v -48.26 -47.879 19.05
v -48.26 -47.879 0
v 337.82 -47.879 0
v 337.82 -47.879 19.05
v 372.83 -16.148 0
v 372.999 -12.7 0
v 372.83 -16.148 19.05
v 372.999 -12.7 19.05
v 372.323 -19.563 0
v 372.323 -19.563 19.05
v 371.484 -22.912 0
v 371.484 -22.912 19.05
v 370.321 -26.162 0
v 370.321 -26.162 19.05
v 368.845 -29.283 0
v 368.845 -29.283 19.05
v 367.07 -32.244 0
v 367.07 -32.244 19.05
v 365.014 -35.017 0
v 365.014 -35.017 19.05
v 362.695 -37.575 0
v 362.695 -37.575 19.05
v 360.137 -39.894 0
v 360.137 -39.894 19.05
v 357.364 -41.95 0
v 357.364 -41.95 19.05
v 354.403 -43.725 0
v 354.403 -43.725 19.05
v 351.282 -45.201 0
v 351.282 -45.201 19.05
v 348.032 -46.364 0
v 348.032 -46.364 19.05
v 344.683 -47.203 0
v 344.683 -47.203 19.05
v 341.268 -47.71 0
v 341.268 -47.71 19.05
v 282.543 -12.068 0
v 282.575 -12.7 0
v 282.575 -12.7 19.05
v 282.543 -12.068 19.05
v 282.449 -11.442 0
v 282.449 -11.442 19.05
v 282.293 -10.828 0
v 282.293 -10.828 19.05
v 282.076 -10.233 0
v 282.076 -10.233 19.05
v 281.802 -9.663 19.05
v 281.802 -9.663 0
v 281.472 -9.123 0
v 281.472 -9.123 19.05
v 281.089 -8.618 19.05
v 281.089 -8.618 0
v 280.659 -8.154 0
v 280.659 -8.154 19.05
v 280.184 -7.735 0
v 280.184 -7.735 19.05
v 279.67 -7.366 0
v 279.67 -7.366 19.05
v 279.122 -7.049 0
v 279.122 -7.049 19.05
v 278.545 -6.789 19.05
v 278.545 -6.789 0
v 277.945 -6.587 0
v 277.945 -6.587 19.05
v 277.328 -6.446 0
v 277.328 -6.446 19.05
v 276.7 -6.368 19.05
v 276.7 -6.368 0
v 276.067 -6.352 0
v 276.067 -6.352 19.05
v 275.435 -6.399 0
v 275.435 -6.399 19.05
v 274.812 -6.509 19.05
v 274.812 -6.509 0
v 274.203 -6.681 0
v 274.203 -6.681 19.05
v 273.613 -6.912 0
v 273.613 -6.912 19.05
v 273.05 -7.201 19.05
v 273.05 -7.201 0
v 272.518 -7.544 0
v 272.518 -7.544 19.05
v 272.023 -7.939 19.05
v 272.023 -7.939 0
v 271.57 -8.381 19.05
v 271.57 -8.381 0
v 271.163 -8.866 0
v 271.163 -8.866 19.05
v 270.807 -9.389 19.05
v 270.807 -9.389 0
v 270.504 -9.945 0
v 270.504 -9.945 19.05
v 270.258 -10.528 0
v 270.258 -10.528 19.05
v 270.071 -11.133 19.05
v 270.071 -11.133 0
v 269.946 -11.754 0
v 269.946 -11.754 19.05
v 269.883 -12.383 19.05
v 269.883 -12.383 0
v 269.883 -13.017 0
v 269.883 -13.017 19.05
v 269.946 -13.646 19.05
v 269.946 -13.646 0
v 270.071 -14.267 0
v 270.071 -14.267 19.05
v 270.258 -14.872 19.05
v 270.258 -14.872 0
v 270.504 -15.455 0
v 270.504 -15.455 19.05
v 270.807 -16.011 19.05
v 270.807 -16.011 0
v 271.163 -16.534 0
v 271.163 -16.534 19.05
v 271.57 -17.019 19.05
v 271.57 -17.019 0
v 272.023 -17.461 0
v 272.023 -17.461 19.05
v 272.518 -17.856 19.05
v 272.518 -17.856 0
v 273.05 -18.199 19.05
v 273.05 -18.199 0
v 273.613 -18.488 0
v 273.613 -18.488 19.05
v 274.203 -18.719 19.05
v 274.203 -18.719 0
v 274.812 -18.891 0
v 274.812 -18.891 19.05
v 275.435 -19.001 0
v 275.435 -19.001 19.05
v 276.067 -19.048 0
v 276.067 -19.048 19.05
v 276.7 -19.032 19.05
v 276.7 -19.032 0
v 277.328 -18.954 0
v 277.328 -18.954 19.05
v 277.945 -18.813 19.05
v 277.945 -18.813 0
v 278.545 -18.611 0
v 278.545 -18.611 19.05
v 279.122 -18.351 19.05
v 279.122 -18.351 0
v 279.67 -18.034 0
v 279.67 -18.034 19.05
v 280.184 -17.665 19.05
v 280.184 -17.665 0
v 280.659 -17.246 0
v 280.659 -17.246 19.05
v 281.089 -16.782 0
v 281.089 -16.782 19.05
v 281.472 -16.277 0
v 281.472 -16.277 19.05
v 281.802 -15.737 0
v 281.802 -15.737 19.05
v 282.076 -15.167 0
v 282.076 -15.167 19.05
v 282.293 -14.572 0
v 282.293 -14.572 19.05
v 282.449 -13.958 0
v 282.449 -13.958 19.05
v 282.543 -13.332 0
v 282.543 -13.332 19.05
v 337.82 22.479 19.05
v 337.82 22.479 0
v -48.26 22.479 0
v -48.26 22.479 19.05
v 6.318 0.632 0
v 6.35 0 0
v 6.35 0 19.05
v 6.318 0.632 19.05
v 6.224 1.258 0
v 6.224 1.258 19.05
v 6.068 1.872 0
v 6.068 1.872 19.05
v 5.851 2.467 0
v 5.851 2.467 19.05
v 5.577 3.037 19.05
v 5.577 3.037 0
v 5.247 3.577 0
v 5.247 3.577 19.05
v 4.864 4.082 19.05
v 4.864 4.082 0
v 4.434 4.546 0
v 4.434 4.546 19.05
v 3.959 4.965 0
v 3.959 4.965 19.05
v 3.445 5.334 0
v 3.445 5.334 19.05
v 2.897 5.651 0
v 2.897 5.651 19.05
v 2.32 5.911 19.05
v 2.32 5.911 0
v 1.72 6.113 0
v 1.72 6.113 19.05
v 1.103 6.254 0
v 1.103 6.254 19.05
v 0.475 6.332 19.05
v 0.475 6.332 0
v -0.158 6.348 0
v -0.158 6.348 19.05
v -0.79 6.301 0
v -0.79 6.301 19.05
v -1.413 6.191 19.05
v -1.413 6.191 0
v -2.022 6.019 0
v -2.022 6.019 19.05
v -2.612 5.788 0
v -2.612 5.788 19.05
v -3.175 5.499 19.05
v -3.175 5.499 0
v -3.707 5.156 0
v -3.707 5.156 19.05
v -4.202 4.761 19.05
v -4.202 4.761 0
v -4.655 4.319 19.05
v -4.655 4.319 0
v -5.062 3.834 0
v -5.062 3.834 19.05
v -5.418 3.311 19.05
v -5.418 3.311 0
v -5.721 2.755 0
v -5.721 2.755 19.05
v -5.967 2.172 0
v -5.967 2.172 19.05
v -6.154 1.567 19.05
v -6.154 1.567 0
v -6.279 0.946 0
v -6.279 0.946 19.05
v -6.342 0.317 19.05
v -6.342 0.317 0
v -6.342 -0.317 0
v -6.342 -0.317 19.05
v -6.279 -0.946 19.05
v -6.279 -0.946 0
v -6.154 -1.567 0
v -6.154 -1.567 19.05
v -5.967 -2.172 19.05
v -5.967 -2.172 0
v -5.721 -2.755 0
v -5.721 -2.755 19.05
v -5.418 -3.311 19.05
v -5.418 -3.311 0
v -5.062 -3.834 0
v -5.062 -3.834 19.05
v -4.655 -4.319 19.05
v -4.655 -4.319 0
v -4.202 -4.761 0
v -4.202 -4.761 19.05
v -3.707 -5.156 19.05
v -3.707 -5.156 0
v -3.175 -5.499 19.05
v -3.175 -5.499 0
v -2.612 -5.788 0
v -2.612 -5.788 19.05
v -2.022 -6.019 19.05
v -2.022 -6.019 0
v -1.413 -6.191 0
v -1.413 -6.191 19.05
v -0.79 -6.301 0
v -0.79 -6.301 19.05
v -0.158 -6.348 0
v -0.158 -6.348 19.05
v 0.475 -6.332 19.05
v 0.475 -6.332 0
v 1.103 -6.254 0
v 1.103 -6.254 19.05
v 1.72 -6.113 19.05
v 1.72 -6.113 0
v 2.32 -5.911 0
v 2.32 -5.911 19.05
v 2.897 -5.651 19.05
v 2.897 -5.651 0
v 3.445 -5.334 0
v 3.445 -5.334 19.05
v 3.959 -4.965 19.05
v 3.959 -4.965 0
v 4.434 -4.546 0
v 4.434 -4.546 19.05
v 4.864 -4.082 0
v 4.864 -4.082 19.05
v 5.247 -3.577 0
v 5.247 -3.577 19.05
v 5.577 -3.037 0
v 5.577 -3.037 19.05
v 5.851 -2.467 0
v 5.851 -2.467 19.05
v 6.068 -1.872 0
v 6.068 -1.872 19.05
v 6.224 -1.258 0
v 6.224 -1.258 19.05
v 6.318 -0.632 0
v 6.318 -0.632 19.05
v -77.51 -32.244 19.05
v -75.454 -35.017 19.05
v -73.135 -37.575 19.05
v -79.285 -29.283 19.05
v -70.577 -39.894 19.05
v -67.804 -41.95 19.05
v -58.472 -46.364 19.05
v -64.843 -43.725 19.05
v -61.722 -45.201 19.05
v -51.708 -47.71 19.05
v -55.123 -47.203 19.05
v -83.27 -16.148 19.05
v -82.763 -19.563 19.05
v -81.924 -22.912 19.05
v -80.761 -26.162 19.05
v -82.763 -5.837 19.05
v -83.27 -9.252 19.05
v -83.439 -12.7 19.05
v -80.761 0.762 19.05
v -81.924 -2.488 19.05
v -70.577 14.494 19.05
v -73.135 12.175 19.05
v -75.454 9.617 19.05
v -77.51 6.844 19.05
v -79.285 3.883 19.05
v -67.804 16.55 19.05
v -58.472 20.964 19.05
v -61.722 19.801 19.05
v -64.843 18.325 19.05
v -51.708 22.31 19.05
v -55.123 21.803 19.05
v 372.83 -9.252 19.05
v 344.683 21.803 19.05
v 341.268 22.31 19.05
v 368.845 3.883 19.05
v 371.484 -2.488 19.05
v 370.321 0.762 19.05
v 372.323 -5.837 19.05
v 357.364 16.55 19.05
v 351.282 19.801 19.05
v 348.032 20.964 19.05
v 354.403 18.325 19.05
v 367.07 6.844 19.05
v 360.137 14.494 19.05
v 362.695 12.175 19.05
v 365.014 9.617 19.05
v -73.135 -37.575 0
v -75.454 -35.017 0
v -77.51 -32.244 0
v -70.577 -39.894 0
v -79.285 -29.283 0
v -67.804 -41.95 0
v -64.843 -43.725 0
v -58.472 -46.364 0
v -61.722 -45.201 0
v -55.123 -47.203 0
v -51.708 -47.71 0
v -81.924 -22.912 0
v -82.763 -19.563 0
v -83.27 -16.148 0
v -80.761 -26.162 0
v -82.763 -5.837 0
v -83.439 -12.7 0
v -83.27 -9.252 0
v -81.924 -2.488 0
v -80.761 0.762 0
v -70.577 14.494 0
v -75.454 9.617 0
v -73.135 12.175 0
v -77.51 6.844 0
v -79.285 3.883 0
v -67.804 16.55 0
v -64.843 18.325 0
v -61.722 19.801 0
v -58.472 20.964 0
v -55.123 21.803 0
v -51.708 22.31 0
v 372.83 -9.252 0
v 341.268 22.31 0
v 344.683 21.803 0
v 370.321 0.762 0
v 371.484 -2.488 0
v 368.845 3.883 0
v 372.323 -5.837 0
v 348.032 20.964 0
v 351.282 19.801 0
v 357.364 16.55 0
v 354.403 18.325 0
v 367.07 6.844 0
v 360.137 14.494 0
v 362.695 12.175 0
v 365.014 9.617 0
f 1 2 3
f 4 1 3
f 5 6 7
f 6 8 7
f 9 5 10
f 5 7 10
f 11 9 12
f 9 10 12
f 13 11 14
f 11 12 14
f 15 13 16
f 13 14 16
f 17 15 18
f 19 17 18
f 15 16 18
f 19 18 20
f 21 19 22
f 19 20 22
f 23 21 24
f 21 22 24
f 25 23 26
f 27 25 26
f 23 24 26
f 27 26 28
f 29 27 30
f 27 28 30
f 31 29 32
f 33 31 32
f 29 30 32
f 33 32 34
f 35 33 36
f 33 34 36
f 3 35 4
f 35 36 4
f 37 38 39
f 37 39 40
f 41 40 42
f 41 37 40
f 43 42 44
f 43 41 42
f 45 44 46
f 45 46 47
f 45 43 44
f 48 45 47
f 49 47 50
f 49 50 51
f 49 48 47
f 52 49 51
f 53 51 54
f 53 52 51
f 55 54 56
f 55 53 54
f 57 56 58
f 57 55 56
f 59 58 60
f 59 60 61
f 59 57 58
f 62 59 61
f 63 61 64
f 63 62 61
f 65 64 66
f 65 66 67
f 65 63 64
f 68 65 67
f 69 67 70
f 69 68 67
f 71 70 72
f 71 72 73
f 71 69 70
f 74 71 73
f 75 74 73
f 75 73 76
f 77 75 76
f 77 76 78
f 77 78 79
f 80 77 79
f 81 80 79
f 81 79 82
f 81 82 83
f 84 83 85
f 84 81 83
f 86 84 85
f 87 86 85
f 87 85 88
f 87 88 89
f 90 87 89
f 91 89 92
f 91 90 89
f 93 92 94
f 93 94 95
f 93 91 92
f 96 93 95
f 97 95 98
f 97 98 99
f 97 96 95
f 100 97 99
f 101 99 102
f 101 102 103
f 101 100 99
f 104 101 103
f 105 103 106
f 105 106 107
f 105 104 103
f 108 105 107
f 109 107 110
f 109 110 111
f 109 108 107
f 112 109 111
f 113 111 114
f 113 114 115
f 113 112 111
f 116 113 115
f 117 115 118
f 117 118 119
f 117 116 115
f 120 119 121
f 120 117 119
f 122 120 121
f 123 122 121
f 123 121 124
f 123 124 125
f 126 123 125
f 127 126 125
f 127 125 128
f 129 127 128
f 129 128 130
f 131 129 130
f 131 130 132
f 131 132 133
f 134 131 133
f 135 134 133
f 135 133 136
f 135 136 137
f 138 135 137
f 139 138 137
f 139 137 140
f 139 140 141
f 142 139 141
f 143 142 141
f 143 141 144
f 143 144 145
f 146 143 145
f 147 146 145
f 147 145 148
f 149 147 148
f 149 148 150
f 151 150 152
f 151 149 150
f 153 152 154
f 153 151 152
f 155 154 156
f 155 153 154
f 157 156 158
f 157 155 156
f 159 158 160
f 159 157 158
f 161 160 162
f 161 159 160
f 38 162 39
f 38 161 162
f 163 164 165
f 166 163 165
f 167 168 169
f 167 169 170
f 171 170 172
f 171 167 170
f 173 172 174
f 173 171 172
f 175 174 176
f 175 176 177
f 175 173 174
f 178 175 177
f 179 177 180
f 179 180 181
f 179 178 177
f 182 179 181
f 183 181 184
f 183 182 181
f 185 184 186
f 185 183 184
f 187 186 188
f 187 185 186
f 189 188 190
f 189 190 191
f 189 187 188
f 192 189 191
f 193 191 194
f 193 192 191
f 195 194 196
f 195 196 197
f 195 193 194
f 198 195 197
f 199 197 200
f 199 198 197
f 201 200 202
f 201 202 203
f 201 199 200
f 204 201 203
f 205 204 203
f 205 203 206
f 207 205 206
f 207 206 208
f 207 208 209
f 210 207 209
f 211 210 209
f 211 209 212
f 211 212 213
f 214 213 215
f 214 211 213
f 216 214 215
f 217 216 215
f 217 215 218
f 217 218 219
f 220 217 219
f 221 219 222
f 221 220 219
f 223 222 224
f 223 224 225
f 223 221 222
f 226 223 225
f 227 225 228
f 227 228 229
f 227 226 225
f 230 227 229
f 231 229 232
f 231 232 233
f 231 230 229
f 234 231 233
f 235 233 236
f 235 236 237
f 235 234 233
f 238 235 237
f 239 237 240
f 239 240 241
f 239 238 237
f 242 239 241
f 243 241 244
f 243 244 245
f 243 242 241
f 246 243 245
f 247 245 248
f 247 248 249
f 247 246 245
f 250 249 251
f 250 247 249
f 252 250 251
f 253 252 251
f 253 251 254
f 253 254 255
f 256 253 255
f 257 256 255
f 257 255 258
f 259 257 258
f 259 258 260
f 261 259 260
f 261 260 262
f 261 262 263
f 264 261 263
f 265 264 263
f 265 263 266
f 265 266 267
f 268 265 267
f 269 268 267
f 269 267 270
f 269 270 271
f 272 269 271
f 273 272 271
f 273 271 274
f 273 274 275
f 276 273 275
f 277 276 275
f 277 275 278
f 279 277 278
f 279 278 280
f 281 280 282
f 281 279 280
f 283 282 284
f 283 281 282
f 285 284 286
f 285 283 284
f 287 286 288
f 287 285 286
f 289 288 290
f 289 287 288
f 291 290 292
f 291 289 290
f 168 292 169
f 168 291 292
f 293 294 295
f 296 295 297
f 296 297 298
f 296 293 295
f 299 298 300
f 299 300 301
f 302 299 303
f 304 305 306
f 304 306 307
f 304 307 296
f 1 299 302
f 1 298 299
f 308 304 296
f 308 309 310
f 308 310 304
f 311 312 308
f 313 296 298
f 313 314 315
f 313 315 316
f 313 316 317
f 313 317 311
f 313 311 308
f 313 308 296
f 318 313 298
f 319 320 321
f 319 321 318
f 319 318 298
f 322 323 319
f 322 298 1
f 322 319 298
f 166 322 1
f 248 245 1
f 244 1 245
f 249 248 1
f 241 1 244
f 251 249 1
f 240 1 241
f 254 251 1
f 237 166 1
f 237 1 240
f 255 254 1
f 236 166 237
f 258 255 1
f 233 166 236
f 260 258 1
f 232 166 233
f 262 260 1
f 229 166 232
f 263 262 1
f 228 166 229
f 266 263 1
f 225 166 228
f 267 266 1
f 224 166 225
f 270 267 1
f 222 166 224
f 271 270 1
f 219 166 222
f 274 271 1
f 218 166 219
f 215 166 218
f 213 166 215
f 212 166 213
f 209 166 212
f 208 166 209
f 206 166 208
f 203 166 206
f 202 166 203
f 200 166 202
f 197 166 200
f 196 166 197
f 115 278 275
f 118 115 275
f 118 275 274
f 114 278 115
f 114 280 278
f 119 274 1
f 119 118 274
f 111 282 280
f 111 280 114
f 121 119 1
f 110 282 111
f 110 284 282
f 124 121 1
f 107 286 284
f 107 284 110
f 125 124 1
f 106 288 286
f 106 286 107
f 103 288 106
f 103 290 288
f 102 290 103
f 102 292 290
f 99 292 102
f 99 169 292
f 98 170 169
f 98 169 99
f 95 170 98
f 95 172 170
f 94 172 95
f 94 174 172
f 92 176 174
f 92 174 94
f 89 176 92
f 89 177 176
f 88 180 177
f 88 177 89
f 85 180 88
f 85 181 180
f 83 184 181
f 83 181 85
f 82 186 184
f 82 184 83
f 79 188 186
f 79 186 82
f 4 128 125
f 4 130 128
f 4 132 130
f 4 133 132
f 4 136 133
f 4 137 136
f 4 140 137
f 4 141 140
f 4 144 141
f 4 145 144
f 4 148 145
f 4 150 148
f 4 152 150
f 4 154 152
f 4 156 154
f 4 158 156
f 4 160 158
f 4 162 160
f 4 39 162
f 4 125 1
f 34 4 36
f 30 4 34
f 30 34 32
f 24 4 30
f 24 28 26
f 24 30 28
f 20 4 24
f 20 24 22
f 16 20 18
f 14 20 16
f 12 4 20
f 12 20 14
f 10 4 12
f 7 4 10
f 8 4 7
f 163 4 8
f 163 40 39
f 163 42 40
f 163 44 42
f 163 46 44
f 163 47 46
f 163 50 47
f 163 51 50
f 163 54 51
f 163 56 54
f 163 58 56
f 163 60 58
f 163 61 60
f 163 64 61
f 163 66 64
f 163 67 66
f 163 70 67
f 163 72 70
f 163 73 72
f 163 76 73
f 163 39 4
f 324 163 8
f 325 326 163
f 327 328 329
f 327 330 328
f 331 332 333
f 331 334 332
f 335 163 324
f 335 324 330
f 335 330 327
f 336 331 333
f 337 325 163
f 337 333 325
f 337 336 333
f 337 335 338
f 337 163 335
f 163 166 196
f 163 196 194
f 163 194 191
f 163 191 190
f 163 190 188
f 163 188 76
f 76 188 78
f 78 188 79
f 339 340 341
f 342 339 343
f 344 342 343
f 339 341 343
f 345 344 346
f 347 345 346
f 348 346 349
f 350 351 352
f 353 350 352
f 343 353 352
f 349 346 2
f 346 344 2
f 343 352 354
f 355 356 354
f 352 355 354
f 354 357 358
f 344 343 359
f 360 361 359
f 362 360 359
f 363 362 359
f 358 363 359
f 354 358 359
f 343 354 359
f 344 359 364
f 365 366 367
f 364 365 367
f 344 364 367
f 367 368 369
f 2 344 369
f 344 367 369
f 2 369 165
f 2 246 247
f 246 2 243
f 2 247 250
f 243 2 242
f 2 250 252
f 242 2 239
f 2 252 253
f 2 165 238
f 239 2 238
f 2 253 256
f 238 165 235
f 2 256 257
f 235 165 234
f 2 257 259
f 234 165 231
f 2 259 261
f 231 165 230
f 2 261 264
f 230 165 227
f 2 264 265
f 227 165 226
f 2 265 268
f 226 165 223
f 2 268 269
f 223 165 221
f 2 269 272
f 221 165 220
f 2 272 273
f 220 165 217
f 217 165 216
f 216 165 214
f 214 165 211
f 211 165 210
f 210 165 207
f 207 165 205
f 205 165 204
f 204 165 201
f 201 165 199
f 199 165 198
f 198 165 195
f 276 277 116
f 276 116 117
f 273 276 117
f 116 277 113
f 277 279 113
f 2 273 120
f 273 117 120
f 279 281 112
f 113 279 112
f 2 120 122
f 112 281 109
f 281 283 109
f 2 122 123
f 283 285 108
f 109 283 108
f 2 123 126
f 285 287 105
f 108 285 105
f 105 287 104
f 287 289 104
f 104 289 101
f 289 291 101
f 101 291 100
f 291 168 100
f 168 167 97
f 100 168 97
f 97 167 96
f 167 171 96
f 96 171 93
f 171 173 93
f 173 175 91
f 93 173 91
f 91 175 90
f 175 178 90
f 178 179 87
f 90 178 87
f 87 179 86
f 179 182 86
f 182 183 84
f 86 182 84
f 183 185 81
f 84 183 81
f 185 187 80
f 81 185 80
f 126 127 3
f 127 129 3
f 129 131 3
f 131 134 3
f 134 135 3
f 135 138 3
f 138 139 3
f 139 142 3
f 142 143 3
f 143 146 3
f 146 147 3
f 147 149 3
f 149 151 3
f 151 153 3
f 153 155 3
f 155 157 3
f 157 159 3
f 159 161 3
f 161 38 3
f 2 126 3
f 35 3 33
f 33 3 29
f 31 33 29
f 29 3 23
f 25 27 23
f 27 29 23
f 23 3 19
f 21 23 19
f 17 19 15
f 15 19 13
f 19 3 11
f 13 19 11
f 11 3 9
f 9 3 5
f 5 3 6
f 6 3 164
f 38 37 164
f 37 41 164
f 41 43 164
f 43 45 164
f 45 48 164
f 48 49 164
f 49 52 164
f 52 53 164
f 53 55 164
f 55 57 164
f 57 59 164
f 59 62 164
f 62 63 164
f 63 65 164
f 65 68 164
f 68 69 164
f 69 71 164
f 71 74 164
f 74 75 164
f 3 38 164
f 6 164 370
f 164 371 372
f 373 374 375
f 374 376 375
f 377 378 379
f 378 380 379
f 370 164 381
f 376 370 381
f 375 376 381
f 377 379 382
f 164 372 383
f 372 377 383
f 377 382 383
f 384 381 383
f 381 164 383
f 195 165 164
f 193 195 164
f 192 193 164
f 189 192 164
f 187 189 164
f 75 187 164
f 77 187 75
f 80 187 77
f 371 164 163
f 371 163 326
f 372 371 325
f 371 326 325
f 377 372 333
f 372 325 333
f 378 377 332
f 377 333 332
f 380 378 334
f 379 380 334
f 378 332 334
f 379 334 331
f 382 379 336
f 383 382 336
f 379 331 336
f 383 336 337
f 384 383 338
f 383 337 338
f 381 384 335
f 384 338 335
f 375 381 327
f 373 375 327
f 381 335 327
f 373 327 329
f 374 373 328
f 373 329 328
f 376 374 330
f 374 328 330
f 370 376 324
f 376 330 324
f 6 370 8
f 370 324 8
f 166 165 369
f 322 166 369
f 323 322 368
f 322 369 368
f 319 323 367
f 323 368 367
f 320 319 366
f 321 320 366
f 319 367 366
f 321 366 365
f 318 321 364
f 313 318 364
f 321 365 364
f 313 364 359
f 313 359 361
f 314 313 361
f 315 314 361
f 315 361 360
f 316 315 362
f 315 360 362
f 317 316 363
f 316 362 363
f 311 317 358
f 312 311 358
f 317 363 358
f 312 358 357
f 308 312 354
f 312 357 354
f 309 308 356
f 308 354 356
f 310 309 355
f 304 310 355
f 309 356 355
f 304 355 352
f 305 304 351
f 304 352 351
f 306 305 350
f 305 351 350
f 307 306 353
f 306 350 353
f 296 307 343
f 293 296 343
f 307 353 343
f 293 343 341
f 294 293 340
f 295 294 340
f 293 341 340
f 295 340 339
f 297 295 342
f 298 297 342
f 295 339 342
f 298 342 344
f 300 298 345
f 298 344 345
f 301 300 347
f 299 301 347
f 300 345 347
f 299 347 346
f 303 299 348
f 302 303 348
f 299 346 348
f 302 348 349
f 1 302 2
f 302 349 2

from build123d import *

# Parameters (mm, degrees)
F0_R     = 6.35
F1_DEPTH = 19.05
F2_R     = 35.17899


# Not quite as in the source:
# - a fillet or chamfer is up to 0.001 mm smaller than in the source, because OpenCascade refuses the exact size


with BuildPart() as f1:
    # F0 (on Top) → F1 (new body)
    with BuildSketch(Plane.XY):
        with BuildLine():
            Line((372.999, 22.479), (-48.26, 22.479))
            ThreePointArc((-48.26, 22.479), (-83.439, -12.7), (-48.26, -47.879))
            Line((-48.26, -47.879), (372.999, -47.879))
            Line((372.999, -47.879), (372.999, 22.479))
        make_face()
        Circle(F0_R, mode=Mode.SUBTRACT)
        with Locations((276.225, -12.7)):
            Circle(F0_R, mode=Mode.SUBTRACT)
    extrude(amount=F1_DEPTH)

    # F2 (radius 35.179 in the source; OpenCascade refuses exactly that, so slightly less here)
    f2_edges = [f1.edges().sort_by_distance(p)[0] for p in [
        (372.999, -47.879, 9.525),
        (372.999, 22.479, 9.525),
    ]]
    fillet(f2_edges, radius=F2_R)


solid = f1.part
